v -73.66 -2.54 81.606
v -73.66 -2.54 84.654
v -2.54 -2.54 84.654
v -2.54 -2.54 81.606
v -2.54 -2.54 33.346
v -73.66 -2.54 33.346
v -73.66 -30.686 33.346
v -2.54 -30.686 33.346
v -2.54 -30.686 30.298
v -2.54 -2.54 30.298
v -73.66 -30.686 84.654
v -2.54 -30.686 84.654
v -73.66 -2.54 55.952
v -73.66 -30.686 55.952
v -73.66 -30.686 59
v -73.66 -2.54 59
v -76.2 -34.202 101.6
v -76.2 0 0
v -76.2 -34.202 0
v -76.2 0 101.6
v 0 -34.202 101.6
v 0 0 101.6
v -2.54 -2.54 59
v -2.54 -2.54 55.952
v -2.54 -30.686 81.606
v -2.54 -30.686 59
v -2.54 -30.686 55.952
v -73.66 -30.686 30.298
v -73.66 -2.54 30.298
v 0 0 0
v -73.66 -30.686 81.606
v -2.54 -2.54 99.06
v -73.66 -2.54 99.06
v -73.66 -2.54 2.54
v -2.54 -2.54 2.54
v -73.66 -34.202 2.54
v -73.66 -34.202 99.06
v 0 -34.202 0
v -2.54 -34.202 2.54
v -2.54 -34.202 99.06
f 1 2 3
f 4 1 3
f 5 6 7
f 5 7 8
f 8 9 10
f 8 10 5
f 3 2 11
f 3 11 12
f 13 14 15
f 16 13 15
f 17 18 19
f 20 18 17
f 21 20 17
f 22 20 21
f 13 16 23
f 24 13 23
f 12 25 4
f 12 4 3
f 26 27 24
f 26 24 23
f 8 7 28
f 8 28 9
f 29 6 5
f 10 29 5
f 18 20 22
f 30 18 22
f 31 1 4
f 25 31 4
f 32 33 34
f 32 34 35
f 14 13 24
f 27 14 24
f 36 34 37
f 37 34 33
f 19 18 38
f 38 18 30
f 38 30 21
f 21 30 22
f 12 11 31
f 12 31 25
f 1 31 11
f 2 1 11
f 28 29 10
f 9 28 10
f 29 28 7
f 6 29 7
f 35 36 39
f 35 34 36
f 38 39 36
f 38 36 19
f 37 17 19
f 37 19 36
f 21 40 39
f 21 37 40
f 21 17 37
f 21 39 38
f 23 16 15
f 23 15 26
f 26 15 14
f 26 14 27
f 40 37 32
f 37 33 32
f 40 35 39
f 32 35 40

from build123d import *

# Parameters (mm, degrees)
F0_W     = 76.2
F0_H     = 101.6
F1_DEPTH = 34.20233
F2_T     = -2.54
F3_W     = 71.12
F3_H     = 3.048
F4_DEPTH = 28.1459


with BuildPart() as f1:
    # F0 (on Front) → F1 (new body)
    with BuildSketch(Plane.XZ):
        with Locations((-38.1, 50.8)):
            Rectangle(F0_W, F0_H)
    extrude(amount=F1_DEPTH)

    # F2
    f2_openings = [f1.faces().sort_by_distance(p)[0] for p in [
        (-38.1, -34.20233, 50.8),
    ]]
    offset(amount=F2_T, openings=f2_openings)


with BuildPart() as f4:
    # F3 (on face) → F4 (new body)
    with BuildSketch(Plane.XZ.offset(2.54)):
        with Locations((-38.1, 57.476429)):
            Rectangle(F3_W, F3_H)
        with Locations((-38.1, 31.822429)):
            Rectangle(F3_W, F3_H)
        with Locations((-38.1, 83.130429)):
            Rectangle(F3_W, F3_H)
    extrude(amount=F4_DEPTH)


solid = Compound([f1.part, f4.part])
